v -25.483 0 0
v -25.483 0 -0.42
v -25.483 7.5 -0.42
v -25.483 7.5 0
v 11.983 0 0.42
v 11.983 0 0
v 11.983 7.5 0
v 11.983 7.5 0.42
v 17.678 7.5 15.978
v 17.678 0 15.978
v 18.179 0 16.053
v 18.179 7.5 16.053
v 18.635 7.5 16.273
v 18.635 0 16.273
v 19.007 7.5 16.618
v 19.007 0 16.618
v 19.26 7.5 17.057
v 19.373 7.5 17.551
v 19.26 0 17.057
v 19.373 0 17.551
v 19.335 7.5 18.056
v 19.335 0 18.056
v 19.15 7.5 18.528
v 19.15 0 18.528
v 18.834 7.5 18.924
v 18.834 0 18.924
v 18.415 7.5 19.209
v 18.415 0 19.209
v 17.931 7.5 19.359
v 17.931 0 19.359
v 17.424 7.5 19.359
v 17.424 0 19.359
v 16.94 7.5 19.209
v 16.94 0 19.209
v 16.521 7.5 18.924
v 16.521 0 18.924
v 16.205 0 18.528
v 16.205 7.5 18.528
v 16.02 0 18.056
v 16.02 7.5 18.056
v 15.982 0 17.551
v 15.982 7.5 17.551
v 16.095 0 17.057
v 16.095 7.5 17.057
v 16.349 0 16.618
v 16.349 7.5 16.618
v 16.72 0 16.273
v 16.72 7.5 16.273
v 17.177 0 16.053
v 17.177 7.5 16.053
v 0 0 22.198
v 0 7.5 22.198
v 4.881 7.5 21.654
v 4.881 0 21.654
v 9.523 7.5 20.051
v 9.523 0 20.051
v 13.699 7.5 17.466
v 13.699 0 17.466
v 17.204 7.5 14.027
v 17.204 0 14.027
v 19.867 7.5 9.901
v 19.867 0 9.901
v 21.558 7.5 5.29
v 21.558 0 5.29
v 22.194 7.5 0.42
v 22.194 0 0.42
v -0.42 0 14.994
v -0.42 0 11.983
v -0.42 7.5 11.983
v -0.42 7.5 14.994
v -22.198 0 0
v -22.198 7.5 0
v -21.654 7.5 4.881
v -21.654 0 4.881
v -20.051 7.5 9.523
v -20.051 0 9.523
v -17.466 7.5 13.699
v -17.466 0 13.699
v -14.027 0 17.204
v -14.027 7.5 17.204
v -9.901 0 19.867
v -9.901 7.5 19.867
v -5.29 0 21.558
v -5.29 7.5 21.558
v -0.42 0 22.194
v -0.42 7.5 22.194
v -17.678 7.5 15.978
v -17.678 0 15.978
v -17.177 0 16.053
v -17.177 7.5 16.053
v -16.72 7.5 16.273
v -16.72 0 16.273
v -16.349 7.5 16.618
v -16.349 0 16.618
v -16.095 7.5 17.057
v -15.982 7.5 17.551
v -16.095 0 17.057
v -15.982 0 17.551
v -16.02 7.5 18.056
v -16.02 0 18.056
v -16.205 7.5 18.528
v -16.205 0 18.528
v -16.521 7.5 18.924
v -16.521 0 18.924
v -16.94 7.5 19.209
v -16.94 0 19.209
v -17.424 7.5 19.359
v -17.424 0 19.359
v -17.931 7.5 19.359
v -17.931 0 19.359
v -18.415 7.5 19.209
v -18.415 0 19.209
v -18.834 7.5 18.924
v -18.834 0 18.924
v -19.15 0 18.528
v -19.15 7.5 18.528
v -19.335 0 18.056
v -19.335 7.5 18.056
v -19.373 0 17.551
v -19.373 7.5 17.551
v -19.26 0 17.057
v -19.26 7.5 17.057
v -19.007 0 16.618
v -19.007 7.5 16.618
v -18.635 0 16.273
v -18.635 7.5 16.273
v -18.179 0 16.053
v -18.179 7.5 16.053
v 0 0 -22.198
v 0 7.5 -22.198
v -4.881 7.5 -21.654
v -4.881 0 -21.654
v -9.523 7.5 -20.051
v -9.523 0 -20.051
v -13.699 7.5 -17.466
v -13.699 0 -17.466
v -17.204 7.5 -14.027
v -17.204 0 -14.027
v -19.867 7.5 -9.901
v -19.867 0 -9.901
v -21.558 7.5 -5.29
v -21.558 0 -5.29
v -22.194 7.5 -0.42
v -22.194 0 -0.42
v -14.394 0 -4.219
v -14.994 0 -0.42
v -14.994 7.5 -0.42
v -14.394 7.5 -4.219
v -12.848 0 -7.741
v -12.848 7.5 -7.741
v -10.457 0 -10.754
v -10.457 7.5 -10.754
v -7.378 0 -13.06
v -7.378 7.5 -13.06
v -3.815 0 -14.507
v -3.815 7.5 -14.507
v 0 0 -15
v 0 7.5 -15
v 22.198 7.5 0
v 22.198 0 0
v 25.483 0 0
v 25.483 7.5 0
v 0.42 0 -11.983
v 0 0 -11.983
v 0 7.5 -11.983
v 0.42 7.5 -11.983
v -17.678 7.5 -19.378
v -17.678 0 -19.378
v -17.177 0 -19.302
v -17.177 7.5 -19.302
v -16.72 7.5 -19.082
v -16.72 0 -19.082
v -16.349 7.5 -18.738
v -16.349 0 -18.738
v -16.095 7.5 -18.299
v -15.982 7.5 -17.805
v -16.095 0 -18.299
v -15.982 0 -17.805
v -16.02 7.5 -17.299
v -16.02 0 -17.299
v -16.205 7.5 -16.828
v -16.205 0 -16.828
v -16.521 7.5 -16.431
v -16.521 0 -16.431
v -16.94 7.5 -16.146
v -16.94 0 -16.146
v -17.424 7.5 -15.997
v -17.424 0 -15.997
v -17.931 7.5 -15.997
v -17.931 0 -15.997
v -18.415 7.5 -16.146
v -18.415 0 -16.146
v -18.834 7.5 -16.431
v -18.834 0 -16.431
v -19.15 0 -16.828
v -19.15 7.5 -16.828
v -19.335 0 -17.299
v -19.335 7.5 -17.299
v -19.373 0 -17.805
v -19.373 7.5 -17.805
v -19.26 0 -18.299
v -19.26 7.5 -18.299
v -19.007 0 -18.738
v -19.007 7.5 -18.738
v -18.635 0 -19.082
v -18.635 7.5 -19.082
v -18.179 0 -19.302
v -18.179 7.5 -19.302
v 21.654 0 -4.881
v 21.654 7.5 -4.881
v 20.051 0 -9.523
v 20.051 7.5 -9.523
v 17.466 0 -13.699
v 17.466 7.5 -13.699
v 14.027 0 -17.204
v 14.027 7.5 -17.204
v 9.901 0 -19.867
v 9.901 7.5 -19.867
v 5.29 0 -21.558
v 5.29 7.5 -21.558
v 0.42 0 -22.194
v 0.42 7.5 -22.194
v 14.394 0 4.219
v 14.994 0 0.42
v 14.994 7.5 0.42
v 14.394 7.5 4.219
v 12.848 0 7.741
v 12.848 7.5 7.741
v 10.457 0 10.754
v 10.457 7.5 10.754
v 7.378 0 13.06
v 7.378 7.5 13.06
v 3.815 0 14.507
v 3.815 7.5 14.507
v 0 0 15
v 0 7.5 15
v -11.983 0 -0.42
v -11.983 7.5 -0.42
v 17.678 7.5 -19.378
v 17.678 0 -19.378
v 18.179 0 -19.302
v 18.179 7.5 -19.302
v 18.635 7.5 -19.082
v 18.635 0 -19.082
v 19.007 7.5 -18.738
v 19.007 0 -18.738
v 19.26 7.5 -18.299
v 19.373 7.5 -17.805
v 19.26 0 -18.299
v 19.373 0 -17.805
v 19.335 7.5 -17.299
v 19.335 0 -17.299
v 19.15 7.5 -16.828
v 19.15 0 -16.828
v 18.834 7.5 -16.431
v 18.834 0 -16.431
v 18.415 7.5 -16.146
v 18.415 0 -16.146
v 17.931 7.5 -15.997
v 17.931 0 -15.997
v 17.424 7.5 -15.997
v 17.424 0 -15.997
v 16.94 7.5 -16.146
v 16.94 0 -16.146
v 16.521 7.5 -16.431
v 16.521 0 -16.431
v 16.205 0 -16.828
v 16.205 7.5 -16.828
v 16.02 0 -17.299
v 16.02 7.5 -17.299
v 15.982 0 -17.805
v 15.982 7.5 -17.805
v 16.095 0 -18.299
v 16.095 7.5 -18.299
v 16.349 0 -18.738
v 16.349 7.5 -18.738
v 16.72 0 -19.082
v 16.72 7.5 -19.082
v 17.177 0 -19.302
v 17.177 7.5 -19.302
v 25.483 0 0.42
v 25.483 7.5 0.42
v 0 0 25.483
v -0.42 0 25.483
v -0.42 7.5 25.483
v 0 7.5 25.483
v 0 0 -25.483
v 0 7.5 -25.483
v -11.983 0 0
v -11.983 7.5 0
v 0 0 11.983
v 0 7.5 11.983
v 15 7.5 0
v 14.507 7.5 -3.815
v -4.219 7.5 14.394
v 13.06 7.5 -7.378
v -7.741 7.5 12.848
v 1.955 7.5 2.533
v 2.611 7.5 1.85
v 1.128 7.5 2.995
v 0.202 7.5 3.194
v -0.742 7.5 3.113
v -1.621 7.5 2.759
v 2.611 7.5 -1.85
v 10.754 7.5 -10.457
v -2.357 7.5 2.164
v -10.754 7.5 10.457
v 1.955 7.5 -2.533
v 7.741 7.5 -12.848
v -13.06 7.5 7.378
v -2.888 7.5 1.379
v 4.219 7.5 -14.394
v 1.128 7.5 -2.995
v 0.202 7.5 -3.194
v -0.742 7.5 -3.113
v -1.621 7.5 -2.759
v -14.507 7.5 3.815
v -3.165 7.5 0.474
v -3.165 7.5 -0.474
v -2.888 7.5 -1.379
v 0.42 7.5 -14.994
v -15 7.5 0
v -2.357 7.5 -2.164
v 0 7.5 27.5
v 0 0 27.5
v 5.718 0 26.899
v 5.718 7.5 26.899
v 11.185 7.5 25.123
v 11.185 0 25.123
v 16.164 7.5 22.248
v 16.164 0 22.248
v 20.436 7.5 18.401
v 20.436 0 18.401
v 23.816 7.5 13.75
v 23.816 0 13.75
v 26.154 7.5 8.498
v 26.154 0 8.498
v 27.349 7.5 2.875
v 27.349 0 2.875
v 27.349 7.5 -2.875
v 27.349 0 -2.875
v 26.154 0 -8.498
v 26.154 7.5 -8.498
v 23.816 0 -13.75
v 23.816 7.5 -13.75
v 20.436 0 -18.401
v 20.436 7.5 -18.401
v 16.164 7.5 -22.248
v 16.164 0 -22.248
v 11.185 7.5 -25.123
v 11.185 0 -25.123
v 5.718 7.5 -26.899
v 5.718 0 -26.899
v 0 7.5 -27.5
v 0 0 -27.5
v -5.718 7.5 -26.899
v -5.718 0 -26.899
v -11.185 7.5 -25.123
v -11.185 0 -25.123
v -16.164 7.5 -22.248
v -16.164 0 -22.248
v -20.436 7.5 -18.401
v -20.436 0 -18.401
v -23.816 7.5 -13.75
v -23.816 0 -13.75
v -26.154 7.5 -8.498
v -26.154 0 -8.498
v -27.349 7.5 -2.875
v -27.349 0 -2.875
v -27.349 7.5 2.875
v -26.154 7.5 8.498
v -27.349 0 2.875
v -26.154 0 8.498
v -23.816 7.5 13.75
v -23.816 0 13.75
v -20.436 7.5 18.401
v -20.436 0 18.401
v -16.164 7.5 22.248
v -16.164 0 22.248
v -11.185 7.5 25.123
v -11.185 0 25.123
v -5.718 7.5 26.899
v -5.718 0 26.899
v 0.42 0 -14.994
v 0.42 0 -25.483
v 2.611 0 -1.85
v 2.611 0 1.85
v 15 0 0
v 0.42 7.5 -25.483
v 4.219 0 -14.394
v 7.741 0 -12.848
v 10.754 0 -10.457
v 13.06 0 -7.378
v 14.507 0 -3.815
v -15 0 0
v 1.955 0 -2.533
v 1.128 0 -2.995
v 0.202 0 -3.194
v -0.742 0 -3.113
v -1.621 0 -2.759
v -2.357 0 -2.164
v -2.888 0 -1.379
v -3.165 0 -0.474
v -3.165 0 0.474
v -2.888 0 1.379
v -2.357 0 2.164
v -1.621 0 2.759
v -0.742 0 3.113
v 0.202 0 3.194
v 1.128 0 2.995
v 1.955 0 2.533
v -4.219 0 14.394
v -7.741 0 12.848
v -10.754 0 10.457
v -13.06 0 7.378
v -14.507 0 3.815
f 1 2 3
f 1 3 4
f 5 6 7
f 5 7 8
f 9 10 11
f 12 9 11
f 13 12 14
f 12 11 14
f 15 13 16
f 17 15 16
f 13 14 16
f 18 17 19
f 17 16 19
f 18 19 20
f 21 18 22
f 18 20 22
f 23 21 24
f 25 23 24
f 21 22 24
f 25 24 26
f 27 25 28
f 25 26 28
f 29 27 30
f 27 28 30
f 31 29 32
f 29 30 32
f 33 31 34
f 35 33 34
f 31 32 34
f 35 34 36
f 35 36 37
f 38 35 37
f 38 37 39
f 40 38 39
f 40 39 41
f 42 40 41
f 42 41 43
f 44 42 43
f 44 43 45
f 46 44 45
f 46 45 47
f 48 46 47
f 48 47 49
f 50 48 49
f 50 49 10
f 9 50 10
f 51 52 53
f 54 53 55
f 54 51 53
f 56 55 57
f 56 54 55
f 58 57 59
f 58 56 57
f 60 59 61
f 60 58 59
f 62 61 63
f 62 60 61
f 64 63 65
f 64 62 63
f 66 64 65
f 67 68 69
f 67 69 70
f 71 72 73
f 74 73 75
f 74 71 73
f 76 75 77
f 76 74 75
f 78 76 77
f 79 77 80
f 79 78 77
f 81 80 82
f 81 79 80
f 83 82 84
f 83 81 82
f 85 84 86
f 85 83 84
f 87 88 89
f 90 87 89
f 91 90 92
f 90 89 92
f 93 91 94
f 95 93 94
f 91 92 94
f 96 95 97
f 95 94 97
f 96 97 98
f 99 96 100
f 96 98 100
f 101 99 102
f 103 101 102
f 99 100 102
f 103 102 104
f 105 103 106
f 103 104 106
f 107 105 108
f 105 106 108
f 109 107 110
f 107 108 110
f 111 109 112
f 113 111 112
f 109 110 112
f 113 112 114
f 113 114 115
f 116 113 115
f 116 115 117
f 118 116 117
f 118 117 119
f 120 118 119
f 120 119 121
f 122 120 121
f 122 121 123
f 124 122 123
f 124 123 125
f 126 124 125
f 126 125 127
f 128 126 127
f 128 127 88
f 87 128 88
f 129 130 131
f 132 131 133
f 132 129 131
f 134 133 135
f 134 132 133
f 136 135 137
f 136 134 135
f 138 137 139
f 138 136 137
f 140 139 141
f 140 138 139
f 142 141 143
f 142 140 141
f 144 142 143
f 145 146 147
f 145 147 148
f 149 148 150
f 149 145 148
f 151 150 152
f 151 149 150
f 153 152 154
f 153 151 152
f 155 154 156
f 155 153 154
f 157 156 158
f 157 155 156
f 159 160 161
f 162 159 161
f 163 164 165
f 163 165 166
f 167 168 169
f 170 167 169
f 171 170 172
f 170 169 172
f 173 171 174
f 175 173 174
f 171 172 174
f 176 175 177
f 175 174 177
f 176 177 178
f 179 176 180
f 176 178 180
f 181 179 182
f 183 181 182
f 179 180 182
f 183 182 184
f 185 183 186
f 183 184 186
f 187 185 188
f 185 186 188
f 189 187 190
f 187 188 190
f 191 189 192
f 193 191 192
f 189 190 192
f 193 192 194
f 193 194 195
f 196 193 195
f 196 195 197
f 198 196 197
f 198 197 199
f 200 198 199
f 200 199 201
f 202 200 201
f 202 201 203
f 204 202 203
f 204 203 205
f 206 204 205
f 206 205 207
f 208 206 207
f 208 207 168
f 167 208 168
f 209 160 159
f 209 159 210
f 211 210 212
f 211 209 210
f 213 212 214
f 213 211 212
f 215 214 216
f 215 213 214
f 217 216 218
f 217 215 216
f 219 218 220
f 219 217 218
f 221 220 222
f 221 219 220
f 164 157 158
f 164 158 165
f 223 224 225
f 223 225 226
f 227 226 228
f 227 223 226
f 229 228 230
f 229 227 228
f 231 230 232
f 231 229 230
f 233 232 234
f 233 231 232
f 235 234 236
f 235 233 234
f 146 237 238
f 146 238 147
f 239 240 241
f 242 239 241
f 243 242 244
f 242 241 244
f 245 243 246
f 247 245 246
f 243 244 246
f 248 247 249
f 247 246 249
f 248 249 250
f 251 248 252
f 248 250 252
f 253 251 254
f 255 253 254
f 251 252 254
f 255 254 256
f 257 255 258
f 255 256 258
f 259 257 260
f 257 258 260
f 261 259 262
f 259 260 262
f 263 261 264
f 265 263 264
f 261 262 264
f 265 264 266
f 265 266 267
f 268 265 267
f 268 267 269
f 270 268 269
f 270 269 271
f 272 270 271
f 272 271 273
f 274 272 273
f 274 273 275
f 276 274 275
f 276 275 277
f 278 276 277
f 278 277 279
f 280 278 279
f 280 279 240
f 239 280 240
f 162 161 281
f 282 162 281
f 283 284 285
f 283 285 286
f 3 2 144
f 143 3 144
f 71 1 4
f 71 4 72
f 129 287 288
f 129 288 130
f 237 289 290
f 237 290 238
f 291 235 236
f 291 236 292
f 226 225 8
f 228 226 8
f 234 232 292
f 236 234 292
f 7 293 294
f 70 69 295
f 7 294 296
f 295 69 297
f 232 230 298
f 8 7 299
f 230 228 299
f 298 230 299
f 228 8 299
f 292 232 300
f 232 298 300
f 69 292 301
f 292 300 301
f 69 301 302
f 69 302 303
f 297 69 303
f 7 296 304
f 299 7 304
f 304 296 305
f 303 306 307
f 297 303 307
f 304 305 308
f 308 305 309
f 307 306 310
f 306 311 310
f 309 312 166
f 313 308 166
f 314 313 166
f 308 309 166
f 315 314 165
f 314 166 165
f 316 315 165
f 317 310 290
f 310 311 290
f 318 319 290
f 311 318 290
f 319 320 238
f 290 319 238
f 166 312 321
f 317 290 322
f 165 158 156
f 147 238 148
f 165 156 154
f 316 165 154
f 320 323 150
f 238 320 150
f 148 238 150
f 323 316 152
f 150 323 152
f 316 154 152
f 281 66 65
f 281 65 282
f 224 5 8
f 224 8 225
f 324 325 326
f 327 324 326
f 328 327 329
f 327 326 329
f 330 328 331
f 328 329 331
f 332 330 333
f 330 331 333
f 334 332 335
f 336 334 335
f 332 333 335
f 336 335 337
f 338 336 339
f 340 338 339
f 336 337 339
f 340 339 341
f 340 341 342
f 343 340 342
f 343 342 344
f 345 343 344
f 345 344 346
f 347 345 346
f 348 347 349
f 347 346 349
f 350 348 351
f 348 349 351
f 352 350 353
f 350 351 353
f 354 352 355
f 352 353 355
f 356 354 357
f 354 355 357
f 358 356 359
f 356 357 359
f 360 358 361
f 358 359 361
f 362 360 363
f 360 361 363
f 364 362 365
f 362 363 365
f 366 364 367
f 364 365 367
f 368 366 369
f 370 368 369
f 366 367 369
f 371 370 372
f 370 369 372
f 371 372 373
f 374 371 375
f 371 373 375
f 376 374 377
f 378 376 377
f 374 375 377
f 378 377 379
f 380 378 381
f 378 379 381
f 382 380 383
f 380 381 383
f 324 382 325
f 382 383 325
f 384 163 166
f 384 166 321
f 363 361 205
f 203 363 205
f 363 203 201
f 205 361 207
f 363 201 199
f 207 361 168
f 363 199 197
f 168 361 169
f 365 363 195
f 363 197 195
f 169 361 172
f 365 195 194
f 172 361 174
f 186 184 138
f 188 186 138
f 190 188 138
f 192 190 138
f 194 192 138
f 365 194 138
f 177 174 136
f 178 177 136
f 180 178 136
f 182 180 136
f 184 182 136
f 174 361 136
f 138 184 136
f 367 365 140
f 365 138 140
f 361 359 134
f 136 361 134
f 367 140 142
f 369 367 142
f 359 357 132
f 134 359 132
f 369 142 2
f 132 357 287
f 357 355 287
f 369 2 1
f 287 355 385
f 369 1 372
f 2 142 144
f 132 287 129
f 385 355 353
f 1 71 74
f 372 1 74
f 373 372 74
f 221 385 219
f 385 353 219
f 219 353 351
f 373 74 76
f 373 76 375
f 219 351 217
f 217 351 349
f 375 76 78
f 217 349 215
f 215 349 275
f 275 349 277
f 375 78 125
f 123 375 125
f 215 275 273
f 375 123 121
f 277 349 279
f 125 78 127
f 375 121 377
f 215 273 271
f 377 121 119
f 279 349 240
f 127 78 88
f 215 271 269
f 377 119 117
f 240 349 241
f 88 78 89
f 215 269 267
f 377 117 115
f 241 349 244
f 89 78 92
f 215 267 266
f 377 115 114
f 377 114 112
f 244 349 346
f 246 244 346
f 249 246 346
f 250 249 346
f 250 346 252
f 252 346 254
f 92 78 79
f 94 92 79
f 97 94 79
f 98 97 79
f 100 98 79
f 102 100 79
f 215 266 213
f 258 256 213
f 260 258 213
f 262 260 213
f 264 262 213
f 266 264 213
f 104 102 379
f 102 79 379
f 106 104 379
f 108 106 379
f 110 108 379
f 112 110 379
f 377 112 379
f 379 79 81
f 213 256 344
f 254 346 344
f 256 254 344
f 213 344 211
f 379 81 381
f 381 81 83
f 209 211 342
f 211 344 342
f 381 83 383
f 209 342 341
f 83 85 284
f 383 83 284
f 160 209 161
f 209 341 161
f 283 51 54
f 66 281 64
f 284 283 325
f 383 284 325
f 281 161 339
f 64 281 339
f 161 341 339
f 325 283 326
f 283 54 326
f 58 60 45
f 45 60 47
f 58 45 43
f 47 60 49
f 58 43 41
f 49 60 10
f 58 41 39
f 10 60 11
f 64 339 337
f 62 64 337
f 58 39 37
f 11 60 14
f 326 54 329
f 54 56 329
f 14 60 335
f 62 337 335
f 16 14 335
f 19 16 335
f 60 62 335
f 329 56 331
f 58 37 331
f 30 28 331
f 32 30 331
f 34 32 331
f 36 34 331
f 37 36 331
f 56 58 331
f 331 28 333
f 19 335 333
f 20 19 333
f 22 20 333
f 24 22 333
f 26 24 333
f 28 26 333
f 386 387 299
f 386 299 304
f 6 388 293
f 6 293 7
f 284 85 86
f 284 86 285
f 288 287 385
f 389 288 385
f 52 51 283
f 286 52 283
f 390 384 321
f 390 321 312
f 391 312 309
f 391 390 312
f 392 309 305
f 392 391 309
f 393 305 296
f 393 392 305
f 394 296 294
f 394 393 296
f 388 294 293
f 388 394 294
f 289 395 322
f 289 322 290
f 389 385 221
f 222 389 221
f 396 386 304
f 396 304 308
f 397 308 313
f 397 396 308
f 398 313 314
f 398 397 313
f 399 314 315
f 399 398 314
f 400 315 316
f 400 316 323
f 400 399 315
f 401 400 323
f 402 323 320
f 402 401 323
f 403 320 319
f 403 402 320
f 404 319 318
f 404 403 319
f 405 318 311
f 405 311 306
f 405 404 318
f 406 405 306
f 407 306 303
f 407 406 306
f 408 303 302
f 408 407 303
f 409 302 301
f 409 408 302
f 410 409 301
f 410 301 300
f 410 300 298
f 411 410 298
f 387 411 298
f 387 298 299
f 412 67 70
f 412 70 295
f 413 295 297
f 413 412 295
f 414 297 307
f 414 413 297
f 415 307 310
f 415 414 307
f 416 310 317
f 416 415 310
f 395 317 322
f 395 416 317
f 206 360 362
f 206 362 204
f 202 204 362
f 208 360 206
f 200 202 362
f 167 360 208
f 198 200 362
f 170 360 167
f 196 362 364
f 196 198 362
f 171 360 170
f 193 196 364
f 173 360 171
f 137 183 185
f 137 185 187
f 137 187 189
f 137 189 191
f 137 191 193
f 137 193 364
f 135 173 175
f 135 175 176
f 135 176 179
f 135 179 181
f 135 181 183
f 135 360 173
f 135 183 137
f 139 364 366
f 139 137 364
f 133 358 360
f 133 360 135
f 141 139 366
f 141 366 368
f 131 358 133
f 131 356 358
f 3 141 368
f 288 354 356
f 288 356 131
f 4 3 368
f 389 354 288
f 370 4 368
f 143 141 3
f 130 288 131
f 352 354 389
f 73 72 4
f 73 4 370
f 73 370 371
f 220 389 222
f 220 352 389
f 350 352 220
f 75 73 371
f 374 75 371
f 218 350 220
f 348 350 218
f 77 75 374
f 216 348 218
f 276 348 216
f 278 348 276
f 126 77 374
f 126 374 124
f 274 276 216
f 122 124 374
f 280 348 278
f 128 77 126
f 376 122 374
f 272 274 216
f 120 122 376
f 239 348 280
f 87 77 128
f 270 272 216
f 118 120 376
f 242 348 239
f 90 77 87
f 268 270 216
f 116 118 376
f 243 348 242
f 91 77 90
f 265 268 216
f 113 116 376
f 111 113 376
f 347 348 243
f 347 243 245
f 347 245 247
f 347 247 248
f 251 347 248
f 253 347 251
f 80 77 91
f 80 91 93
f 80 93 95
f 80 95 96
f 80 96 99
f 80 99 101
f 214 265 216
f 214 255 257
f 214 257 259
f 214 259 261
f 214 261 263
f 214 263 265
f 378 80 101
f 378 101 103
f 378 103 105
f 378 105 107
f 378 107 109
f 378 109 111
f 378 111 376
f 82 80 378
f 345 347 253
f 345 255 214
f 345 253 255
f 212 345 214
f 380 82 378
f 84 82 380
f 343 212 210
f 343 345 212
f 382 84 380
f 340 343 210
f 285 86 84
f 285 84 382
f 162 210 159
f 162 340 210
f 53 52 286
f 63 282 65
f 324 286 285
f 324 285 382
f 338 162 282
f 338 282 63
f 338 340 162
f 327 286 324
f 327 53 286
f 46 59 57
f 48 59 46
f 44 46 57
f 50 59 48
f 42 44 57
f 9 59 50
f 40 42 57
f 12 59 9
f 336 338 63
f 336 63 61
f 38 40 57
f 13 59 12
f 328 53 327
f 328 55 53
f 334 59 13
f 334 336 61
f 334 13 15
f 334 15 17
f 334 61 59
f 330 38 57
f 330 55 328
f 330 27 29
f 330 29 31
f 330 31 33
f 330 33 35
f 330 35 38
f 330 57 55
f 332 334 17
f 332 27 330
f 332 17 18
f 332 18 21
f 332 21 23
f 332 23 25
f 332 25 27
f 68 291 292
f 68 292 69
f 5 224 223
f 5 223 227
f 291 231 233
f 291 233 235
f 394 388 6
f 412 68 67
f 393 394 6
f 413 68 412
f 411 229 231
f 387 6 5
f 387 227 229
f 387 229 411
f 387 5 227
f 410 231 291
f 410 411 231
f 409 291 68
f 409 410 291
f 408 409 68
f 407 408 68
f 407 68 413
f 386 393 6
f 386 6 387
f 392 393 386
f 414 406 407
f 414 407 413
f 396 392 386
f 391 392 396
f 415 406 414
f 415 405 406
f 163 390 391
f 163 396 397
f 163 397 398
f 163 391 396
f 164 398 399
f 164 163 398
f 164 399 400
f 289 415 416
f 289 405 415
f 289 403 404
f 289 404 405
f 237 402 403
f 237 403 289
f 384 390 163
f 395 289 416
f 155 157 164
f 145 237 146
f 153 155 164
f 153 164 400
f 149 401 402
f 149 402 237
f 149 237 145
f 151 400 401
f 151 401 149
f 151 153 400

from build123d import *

# Parameters (mm, degrees)
SKETCH2_R             = 27.5
SKETCH2_R_2           = 22.197520882
BOSS_EXTRUDE3_DEPTH   = 7.5
BOSS_EXTRUDE3_2_DEPTH = 7.5
SKETCH5_R             = 1.7
SKETCH5_W             = 0.42
SKETCH5_H             = 13.5
SKETCH5_W_2           = 13.5
SKETCH5_H_2           = 0.42
CUT_EXTRUDE6_DEPTH    = 40.607448794
CUT_EXTRUDE8_DEPTH    = 7.5


with BuildPart() as part:
    # Sketch2 → Boss-Extrude3 (new body)
    with BuildSketch(Plane(origin=(0, 0, 0), x_dir=(1, 0, 0), z_dir=(0, 1, 0))):
        with Locations(Location((0, 0, 0), (0, 0, 270))):
            Circle(SKETCH2_R)
        with Locations(Location((0, 0, 0), (0, 0, 270))):
            Circle(SKETCH2_R_2, mode=Mode.SUBTRACT)
    extrude(amount=BOSS_EXTRUDE3_DEPTH)

    # Sketch5 → Cut-Extrude6 (cut, through all)
    with BuildSketch(Plane.XZ):
        with Locations(Location((-17.67766953, 17.67766953, 0), (0, 0, 270))):
            Circle(SKETCH5_R)
        with Locations(Location((17.67766953, 17.67766953, 0), (0, 0, 270))):
            Circle(SKETCH5_R)
        with Locations(Location((17.67766953, -17.67766953, 0), (0, 0, 270))):
            Circle(SKETCH5_R)
        with Locations(Location((-17.67766953, -17.67766953, 0), (0, 0, 270))):
            Circle(SKETCH5_R)
        with Locations((0.21, -18.733167206)):
            Rectangle(SKETCH5_W, SKETCH5_H)
        with Locations((-18.733167206, -0.21)):
            Rectangle(SKETCH5_W_2, SKETCH5_H_2)
        with Locations((-0.21, 18.733167206)):
            Rectangle(SKETCH5_W, SKETCH5_H)
        with Locations((18.733167206, 0.21)):
            Rectangle(SKETCH5_W_2, SKETCH5_H_2)
    extrude(amount=-CUT_EXTRUDE6_DEPTH, mode=Mode.SUBTRACT)


with BuildPart() as body_2:
    # Sketch2 → Boss-Extrude3 2 (new body)
    with BuildSketch(Plane(origin=(0, 0, 0), x_dir=(1, 0, 0), z_dir=(0, 1, 0))):
        with BuildLine():
            Line((0, -15), (0, -11.983167206))
            Line((0, -11.983167206), (-0.42, -11.983167206))
            Line((-0.42, -11.983167206), (-0.42, -14.994118847))
            ThreePointArc((-0.42, -14.994118847), (-10.754068997, -10.457055035), (-15, 0))
            Line((-15, 0), (-11.983167206, 0))
            Line((-11.983167206, 0), (-11.983167206, 0.42))
            Line((-11.983167206, 0.42), (-14.994118847, 0.42))
            ThreePointArc((-14.994118847, 0.42), (-10.457055035, 10.754068997), (0, 15))
            Line((0, 15), (0, 11.983167206))
            Line((0, 11.983167206), (0.42, 11.983167206))
            Line((0.42, 11.983167206), (0.42, 14.994118847))
            ThreePointArc((0.42, 14.994118847), (10.754068997, 10.457055035), (15, 0))
            Line((15, 0), (11.983167206, 0))
            Line((11.983167206, 0), (11.983167206, -0.42))
            Line((11.983167206, -0.42), (14.994118847, -0.42))
            ThreePointArc((14.994118847, -0.42), (10.457055035, -10.754068997), (0, -15))
        make_face()
    extrude(amount=BOSS_EXTRUDE3_2_DEPTH)

    # Sketch7 → Cut-Extrude8 (cut)
    with BuildSketch(Plane.XZ):
        with BuildLine():
            Line((2.611025673, 1.850012144), (2.611025673, -1.850012144))
            ThreePointArc((2.611025673, -1.850012144), (-3.2, 0), (2.611025673, 1.850012144))
        make_face()
    extrude(amount=-CUT_EXTRUDE8_DEPTH, mode=Mode.SUBTRACT)


solid = Compound([part.part, body_2.part])
